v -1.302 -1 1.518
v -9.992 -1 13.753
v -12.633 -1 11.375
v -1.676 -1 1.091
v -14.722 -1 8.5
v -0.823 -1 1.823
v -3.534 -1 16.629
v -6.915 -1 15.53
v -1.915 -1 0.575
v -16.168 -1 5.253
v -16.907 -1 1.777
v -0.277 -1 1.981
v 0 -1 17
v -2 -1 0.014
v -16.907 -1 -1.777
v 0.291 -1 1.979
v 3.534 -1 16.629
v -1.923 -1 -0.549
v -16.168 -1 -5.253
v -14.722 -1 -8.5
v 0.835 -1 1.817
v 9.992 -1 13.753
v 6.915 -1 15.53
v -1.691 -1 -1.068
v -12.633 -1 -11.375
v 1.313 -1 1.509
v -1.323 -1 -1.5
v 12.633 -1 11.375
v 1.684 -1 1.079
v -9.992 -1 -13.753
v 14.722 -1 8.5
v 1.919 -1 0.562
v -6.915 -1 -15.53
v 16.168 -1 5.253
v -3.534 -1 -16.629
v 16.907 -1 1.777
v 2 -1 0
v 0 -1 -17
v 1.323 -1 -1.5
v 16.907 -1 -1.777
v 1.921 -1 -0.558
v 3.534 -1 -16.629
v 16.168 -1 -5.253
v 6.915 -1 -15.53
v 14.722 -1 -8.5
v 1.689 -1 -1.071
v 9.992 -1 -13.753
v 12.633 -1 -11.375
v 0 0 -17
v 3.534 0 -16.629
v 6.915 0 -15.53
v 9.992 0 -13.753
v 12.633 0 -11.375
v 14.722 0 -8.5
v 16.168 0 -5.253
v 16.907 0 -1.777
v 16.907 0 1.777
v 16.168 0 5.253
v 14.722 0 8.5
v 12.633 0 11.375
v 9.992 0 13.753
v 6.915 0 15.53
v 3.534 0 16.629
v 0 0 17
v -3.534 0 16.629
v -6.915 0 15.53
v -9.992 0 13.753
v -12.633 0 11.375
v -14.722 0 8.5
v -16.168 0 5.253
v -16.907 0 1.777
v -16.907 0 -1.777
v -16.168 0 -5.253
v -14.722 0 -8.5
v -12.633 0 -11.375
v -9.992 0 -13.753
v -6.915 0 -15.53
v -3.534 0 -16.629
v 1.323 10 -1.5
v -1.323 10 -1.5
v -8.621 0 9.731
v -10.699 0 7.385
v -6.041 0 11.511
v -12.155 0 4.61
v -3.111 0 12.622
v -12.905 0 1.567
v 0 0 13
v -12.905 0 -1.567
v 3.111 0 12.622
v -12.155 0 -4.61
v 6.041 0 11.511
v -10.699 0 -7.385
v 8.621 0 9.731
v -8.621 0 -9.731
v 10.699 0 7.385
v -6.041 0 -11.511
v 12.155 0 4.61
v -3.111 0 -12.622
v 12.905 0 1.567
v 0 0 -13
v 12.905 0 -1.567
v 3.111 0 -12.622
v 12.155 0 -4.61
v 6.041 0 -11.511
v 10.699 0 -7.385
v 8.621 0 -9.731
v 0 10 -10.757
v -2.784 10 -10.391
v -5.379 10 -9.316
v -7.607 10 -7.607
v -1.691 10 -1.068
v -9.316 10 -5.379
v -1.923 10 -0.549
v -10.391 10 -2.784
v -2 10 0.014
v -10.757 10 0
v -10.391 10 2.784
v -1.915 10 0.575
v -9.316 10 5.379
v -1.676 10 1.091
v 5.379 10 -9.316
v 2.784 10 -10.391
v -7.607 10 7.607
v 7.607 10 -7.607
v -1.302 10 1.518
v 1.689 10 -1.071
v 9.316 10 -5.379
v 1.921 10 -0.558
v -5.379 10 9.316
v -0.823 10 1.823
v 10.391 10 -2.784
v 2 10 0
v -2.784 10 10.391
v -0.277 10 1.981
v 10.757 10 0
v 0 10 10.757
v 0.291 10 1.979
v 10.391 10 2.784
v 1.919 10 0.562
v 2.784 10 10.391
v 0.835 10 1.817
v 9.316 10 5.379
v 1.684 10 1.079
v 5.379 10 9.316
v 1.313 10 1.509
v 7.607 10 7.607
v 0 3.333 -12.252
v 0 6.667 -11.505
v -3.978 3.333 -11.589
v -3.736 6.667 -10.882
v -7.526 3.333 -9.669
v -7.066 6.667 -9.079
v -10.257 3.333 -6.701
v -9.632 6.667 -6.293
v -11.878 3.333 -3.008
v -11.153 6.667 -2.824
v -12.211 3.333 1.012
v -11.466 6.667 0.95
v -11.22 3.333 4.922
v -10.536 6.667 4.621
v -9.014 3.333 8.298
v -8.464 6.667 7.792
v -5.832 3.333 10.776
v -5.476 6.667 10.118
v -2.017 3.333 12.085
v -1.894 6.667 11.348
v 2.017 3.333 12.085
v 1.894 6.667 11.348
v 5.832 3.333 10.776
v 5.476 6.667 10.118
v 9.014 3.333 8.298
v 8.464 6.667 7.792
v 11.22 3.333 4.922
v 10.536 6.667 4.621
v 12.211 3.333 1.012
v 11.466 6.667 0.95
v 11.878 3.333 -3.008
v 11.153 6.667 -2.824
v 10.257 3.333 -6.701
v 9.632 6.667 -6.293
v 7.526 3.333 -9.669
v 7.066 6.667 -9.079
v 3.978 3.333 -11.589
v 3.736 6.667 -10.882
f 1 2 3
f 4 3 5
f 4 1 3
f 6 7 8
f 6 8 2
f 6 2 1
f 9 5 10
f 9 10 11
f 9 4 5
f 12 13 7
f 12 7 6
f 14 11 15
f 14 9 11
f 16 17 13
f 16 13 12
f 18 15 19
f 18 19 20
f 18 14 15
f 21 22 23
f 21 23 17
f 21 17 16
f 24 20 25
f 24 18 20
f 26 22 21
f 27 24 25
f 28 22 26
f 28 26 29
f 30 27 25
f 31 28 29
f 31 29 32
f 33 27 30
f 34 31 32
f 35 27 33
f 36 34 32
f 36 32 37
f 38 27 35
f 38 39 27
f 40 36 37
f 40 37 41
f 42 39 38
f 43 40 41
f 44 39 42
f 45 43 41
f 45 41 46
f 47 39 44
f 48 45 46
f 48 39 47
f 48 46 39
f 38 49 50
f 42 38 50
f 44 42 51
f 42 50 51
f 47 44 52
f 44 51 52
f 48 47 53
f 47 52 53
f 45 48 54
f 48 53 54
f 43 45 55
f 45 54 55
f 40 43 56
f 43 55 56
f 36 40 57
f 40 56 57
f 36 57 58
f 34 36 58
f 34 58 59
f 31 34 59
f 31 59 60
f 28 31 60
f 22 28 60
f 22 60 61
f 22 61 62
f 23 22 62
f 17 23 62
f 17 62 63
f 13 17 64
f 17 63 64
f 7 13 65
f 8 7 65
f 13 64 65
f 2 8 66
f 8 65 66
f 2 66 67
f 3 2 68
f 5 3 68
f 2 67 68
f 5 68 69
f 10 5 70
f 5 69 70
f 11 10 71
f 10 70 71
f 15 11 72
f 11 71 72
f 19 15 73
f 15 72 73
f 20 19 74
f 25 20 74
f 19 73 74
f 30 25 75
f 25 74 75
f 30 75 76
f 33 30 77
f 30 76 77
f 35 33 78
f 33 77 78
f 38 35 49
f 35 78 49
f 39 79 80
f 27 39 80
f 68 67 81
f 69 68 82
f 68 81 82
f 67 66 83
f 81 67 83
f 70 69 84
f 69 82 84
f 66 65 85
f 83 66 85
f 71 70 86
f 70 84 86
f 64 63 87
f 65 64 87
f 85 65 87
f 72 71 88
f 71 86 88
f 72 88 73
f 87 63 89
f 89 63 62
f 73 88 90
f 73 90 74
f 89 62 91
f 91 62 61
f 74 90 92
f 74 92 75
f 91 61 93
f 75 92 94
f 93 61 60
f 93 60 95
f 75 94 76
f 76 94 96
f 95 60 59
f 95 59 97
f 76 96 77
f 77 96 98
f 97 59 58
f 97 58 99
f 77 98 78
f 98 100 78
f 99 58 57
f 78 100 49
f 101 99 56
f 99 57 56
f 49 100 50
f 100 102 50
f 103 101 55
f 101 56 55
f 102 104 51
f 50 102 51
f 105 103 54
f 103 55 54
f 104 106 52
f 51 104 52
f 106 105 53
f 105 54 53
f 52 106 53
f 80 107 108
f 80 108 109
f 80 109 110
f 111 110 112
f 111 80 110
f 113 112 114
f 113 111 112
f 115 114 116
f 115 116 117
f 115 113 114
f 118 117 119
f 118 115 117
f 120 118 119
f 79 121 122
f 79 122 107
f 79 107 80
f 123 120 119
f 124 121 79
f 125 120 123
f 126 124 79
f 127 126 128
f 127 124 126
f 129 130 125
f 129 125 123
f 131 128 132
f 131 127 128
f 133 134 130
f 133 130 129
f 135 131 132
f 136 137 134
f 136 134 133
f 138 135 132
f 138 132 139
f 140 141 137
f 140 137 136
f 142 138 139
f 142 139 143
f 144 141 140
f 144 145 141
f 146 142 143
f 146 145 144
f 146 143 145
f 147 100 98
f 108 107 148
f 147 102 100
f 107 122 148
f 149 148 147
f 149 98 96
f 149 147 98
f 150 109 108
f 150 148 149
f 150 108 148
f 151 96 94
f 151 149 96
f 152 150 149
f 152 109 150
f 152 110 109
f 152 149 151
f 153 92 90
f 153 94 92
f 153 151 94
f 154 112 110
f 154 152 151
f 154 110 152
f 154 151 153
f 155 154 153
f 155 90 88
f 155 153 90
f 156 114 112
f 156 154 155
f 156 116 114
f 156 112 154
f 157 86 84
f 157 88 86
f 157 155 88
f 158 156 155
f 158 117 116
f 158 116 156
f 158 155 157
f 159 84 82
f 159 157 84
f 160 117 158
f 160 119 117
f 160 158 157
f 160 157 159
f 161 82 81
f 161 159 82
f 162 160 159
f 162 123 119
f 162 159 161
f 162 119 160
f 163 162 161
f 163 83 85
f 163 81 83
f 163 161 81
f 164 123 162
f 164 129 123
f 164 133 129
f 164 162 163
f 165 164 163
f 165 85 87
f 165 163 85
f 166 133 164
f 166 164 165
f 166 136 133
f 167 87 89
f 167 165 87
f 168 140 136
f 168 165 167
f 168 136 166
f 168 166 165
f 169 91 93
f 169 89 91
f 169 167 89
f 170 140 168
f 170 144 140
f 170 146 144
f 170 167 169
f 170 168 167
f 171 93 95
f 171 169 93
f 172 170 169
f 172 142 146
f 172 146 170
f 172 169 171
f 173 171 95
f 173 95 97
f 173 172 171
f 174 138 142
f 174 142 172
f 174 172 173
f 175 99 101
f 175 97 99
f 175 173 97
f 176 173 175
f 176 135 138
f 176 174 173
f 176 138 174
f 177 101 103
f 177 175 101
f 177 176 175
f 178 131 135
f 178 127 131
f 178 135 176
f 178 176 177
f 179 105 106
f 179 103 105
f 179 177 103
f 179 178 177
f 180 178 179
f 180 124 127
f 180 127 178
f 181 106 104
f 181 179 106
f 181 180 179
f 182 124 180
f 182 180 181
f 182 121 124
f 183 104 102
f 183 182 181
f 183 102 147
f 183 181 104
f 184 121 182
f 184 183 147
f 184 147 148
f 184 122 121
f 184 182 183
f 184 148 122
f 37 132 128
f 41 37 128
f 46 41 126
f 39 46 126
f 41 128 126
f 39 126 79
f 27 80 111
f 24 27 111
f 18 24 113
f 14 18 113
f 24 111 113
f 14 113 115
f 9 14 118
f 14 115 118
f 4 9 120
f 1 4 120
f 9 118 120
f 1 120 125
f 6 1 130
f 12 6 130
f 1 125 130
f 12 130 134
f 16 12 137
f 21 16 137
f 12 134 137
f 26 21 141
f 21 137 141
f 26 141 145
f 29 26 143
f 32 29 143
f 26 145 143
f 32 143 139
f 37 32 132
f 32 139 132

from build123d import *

# Parameters (mm, degrees)
SKETCH1_R           = 13
BOSS_EXTRUDE1_DEPTH = 10
SKETCH3_R           = 17
BOSS_EXTRUDE2_DEPTH = 1
CUT_EXTRUDE2_DEPTH  = 27.438608133


with BuildPart() as part:
    # Sketch1 → Boss-Extrude1 (new body)
    with BuildSketch(Plane(origin=(0, 0, 0), x_dir=(1, 0, 0), z_dir=(0, 1, 0))):
        with Locations(Location((0, 0, 0), (0, 0, 270))):
            Circle(SKETCH1_R)
    extrude(amount=BOSS_EXTRUDE1_DEPTH)

    # Sketch2 → Cut-Revolve1 (revolve, cut)
    with BuildSketch(Plane(origin=(0, 0, 0), x_dir=(0, 0, -1), z_dir=(1, 0, 0)), mode=Mode.PRIVATE) as cut_revolve1_sk:
        Polygon((-13, 0), (-10.757403894, 10), (-13, 10), align=None)
    revolve(cut_revolve1_sk.sketch.rotate(Axis((0, 0, 0), (0, 1, 0)), 180), axis=Axis((0, 0, 0), (0, 1, 0)), mode=Mode.SUBTRACT)

    # Sketch3 → Boss-Extrude2 (add)
    with BuildSketch(Plane(origin=(0, 0, 0), x_dir=(-1, 0, 0), z_dir=(0, -1, 0))):
        with Locations(Location((0, 0, 0), (0, 0, 90))):
            Circle(SKETCH3_R)
    extrude(amount=BOSS_EXTRUDE2_DEPTH)

    # Sketch5 → Cut-Extrude2 (cut, through all)
    with BuildSketch(Plane(origin=(0, 10, 0), x_dir=(1, 0, 0), z_dir=(0, 1, 0))):
        with BuildLine():
            Line((1.322875656, 1.5), (-1.322875656, 1.5))
            ThreePointArc((-1.322875656, 1.5), (-0.822875656, -1.822875656), (2, 0))
            ThreePointArc((2, 0), (1.822875656, 0.822875656), (1.322875656, 1.5))
        make_face()
    extrude(amount=-CUT_EXTRUDE2_DEPTH, mode=Mode.SUBTRACT)


solid = part.part
